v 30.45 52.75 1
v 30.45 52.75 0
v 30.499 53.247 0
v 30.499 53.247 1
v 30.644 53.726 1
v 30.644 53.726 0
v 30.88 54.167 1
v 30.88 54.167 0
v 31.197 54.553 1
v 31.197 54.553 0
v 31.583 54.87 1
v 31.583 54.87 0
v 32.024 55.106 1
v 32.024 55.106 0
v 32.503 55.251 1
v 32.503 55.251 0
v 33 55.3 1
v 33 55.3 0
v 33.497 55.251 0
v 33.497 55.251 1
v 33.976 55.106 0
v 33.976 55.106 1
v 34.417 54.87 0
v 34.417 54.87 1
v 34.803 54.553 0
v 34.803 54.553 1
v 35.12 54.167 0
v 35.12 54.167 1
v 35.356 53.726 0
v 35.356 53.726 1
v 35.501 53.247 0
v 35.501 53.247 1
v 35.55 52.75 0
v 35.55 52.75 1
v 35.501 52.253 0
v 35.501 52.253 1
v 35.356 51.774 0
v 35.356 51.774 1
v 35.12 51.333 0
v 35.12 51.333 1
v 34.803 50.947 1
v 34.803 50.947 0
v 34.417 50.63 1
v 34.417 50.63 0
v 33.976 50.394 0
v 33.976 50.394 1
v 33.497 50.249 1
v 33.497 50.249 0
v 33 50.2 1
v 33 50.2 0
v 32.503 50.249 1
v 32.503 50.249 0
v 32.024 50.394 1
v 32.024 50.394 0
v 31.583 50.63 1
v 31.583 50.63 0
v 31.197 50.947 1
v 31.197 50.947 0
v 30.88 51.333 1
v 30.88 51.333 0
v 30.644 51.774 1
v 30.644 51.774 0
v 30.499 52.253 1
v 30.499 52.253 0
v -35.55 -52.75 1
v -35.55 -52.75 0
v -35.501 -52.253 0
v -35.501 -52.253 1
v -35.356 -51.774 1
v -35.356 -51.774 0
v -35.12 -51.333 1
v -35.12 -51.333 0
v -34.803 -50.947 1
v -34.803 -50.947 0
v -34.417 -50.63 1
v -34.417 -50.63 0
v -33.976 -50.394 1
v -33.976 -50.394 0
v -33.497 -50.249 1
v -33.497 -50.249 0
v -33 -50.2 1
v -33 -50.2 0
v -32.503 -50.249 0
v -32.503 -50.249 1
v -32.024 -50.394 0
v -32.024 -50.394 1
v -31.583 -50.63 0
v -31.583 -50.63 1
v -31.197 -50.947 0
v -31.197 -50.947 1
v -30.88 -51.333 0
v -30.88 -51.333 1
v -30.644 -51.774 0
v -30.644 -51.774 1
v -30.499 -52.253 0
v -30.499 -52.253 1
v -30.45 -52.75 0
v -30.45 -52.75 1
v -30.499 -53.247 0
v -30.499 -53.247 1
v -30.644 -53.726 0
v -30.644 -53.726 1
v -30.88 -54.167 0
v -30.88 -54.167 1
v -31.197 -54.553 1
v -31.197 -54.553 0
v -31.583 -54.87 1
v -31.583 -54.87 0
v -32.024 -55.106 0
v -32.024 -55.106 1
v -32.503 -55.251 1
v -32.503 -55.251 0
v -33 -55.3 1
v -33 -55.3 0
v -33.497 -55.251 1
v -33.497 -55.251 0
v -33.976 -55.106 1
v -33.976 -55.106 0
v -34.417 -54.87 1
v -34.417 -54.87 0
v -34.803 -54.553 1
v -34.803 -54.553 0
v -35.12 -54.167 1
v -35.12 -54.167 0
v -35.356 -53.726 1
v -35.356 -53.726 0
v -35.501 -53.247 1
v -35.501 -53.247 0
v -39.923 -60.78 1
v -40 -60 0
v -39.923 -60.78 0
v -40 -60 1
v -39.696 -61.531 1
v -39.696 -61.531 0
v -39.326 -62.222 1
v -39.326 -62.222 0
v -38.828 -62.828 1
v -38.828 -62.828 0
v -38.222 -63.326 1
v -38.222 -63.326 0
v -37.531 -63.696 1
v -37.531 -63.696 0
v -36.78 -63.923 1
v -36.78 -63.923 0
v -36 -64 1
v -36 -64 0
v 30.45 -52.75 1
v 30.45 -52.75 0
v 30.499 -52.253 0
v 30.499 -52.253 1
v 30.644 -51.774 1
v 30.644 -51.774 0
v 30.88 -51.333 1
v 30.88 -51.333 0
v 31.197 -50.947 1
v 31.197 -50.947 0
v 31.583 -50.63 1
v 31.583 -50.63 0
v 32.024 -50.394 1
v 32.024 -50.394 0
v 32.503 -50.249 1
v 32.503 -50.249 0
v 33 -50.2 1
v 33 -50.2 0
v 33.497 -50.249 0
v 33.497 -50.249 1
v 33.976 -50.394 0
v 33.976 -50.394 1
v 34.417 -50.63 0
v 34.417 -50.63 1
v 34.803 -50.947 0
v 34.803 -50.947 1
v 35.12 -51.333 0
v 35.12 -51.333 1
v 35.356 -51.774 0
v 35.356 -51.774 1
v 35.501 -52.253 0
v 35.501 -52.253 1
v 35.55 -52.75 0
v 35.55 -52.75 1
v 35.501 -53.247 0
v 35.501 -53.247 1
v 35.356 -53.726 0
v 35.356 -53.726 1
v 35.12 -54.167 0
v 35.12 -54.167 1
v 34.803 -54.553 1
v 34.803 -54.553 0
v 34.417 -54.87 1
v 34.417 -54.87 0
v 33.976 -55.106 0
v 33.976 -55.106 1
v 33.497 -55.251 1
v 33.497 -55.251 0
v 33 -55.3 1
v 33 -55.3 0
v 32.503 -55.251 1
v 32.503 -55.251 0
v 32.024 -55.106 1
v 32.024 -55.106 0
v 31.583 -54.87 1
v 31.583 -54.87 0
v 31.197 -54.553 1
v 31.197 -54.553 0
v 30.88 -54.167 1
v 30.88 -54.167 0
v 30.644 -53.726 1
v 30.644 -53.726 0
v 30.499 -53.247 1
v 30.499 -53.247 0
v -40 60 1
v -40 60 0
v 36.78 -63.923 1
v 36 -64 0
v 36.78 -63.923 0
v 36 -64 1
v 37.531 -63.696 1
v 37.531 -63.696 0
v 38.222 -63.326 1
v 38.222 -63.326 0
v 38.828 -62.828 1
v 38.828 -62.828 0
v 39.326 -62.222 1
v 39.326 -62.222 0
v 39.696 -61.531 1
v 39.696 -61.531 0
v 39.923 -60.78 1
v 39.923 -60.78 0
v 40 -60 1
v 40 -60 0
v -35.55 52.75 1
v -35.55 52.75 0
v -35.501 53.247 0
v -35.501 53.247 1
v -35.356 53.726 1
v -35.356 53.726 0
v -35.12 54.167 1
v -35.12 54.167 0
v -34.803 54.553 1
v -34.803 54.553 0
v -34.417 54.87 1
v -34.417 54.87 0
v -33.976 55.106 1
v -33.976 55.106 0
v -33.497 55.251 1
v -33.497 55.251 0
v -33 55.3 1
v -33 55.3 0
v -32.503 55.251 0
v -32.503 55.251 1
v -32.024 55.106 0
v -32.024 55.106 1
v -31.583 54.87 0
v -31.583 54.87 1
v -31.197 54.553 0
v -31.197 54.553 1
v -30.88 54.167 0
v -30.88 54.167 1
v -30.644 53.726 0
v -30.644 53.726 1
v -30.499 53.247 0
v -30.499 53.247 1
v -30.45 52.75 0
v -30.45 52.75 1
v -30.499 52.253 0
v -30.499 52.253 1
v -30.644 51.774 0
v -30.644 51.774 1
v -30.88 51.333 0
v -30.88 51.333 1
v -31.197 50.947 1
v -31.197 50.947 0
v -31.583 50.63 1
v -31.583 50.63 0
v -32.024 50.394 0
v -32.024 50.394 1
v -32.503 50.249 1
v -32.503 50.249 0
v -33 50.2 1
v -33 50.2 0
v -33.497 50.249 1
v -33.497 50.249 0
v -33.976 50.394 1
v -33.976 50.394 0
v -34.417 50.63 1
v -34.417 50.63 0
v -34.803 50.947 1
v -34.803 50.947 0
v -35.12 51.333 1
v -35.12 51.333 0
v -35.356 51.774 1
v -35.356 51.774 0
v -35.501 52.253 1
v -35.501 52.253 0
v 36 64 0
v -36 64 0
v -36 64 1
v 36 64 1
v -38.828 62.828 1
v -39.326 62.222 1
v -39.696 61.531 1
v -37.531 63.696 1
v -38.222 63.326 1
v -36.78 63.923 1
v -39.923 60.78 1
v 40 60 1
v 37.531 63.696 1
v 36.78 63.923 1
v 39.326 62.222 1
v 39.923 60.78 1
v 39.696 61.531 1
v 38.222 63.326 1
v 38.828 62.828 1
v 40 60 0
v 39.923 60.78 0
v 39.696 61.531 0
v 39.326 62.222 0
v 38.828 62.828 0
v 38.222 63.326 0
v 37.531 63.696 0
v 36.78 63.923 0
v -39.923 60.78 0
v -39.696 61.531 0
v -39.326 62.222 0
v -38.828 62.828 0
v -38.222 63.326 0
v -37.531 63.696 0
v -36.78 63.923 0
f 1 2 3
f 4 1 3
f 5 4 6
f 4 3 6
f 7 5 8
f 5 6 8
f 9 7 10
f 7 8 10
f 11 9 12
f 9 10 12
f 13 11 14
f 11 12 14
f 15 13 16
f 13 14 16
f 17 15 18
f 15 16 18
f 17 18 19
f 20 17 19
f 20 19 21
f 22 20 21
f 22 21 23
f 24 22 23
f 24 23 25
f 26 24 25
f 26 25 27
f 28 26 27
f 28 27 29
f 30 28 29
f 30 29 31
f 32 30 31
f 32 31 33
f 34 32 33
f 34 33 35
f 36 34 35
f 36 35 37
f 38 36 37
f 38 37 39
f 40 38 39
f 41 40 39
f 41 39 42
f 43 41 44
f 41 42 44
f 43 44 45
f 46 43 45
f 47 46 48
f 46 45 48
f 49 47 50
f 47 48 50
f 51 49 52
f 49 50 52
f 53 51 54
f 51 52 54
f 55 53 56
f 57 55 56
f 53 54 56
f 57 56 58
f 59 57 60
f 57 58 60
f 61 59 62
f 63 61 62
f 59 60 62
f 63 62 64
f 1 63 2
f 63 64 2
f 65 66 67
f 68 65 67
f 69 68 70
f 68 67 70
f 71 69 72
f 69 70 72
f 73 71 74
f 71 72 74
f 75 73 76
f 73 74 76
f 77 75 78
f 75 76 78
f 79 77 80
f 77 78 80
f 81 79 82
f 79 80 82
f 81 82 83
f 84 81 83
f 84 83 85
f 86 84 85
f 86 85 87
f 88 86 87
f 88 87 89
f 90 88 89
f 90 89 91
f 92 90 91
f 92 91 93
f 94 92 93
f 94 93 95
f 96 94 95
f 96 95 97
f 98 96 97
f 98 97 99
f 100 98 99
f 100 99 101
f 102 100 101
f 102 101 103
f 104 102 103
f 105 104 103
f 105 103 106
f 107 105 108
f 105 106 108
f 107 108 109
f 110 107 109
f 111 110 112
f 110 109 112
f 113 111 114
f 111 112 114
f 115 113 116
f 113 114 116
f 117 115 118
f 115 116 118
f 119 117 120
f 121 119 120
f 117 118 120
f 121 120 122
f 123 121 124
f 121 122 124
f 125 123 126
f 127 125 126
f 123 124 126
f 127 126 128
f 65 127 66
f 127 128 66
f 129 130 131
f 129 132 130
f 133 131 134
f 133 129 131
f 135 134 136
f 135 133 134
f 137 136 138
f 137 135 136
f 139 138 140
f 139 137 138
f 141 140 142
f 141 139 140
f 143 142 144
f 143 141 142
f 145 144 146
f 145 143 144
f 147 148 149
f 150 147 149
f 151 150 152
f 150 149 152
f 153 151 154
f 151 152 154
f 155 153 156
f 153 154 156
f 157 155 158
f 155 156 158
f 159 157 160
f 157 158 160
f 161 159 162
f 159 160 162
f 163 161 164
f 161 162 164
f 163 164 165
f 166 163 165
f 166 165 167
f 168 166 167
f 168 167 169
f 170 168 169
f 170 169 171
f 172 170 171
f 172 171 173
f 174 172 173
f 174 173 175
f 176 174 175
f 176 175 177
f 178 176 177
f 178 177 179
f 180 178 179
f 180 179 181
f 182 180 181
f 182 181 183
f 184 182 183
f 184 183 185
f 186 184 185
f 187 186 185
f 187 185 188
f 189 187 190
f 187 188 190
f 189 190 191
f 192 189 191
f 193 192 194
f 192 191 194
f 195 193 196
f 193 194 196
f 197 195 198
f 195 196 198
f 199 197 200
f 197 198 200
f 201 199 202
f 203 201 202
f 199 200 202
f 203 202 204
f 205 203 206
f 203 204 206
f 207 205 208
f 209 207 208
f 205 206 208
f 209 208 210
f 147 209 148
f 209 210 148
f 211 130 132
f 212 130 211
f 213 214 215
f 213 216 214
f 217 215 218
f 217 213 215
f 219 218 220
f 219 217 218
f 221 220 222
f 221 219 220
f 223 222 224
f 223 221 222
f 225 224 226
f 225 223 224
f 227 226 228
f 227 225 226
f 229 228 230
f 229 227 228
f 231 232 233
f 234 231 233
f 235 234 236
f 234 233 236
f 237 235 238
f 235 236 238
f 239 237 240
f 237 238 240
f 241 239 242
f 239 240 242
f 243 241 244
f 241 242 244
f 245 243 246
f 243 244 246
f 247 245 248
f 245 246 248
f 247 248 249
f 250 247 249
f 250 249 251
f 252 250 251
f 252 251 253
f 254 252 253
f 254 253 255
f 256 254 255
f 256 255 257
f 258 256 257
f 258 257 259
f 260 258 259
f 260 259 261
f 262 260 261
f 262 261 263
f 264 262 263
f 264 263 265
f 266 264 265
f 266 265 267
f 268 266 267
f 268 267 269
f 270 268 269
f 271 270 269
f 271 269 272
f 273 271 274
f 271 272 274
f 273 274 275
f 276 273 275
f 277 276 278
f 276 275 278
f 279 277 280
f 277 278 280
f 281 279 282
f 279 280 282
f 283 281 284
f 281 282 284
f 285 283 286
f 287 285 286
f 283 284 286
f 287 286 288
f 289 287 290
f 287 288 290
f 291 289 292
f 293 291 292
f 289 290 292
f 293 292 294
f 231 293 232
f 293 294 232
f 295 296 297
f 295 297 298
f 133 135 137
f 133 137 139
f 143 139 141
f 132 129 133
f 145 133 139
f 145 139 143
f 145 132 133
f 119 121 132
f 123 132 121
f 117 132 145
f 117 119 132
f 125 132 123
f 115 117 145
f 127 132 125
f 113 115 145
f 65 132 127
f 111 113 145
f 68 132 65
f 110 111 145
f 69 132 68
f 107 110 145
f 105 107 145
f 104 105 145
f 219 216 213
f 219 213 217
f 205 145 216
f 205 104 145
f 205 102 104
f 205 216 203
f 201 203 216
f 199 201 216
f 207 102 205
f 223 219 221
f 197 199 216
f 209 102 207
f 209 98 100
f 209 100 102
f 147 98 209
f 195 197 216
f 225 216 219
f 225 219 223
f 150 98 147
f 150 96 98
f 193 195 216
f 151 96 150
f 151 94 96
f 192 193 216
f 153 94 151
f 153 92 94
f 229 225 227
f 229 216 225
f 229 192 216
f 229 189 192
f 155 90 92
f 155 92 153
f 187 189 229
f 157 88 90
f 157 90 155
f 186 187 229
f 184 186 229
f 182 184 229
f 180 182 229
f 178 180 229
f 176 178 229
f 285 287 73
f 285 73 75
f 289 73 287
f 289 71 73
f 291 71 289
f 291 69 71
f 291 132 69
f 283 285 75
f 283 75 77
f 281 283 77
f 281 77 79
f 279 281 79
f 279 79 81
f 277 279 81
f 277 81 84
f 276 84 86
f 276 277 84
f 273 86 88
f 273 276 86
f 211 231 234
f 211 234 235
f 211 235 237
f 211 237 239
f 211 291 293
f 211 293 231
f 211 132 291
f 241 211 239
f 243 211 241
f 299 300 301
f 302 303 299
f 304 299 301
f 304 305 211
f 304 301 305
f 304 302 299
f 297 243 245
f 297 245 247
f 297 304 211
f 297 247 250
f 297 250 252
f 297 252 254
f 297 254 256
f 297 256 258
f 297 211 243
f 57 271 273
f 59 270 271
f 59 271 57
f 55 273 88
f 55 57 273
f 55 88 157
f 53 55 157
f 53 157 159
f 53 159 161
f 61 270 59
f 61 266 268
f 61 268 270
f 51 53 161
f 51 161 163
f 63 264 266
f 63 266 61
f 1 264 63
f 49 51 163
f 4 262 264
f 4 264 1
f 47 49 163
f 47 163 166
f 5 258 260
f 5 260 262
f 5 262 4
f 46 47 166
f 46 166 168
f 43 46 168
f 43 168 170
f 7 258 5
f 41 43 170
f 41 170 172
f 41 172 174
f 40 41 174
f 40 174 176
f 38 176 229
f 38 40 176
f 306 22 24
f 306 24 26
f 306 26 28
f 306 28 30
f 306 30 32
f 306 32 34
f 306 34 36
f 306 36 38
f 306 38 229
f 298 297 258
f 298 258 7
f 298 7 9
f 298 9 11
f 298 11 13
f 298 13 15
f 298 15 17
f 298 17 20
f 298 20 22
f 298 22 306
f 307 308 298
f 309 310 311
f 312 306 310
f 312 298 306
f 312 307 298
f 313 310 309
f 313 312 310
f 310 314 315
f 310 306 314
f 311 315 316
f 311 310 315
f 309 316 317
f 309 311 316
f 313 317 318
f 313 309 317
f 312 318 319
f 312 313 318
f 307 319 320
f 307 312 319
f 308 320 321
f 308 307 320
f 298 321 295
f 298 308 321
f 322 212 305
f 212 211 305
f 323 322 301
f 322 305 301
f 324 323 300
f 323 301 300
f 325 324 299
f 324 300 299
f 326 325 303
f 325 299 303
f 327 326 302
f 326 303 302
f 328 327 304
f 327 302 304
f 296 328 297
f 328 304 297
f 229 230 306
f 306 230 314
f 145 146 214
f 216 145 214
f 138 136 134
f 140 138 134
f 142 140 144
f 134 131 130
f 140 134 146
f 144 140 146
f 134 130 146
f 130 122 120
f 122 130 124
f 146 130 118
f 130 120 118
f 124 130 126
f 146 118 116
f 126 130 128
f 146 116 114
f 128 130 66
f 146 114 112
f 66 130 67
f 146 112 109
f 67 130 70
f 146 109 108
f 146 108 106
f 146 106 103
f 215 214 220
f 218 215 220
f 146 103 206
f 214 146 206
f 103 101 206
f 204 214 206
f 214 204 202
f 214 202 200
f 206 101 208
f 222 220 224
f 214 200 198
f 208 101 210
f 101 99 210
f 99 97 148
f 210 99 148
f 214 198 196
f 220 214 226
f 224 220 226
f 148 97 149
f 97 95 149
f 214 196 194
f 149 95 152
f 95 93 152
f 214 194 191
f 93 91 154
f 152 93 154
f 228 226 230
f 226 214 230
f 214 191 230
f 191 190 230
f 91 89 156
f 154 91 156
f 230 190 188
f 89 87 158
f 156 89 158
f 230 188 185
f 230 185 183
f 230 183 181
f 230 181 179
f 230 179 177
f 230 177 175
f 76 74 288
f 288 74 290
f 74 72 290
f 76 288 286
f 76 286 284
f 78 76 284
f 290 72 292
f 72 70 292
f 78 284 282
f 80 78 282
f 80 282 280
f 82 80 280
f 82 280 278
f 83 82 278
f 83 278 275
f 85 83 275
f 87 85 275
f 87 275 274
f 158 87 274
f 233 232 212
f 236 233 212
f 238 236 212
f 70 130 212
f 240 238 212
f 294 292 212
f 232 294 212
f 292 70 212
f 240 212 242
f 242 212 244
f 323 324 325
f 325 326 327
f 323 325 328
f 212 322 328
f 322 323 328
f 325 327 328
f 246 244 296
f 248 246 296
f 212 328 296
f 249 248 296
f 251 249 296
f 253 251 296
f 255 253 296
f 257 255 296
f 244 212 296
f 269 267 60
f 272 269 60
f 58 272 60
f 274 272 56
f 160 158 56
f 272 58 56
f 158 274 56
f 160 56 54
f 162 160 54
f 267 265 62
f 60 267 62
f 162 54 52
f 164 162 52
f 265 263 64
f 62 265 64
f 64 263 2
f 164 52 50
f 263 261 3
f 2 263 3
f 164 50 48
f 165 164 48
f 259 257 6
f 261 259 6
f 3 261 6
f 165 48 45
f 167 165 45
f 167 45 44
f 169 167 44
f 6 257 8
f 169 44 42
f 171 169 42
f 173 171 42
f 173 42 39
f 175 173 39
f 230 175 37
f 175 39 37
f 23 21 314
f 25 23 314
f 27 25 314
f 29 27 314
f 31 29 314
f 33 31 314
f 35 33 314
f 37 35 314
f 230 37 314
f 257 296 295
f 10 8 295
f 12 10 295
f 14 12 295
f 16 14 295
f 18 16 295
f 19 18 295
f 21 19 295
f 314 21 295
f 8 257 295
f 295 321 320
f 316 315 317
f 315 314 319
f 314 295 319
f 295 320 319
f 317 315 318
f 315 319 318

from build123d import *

# Parameters (mm, degrees)
SKETCH1_W           = 80
SKETCH1_H           = 128
BOSS_EXTRUDE1_DEPTH = 1
FILLET1_R           = 4
SKETCH2_R           = 2.55
CUT_EXTRUDE1_DEPTH  = 76.478473752


with BuildPart() as part:
    # Sketch1 → Boss-Extrude1 (new body)
    with BuildSketch(Plane.XY):
        Rectangle(SKETCH1_W, SKETCH1_H)
    extrude(amount=BOSS_EXTRUDE1_DEPTH)

    # Fillet1
    fillet1_edges = [part.edges().sort_by_distance(p)[0] for p in [
        (40, -64, 0.5),
        (-40, -64, 0.5),
        (-40, 64, 0.5),
        (40, 64, 0.5),
    ]]
    fillet(fillet1_edges, radius=FILLET1_R)

    # Sketch2 → Cut-Extrude1 (cut, through all)
    with BuildSketch(Plane(origin=(0, 0, 0), x_dir=(-1, 0, 0), z_dir=(0, 0, -1))):
        with Locations((-33, -52.75)):
            Circle(SKETCH2_R)
        with Locations((-33, 52.75)):
            Circle(SKETCH2_R)
        with Locations((33, 52.75)):
            Circle(SKETCH2_R)
        with Locations((33, -52.75)):
            Circle(SKETCH2_R)
    extrude(amount=-CUT_EXTRUDE1_DEPTH, mode=Mode.SUBTRACT)


solid = part.part
